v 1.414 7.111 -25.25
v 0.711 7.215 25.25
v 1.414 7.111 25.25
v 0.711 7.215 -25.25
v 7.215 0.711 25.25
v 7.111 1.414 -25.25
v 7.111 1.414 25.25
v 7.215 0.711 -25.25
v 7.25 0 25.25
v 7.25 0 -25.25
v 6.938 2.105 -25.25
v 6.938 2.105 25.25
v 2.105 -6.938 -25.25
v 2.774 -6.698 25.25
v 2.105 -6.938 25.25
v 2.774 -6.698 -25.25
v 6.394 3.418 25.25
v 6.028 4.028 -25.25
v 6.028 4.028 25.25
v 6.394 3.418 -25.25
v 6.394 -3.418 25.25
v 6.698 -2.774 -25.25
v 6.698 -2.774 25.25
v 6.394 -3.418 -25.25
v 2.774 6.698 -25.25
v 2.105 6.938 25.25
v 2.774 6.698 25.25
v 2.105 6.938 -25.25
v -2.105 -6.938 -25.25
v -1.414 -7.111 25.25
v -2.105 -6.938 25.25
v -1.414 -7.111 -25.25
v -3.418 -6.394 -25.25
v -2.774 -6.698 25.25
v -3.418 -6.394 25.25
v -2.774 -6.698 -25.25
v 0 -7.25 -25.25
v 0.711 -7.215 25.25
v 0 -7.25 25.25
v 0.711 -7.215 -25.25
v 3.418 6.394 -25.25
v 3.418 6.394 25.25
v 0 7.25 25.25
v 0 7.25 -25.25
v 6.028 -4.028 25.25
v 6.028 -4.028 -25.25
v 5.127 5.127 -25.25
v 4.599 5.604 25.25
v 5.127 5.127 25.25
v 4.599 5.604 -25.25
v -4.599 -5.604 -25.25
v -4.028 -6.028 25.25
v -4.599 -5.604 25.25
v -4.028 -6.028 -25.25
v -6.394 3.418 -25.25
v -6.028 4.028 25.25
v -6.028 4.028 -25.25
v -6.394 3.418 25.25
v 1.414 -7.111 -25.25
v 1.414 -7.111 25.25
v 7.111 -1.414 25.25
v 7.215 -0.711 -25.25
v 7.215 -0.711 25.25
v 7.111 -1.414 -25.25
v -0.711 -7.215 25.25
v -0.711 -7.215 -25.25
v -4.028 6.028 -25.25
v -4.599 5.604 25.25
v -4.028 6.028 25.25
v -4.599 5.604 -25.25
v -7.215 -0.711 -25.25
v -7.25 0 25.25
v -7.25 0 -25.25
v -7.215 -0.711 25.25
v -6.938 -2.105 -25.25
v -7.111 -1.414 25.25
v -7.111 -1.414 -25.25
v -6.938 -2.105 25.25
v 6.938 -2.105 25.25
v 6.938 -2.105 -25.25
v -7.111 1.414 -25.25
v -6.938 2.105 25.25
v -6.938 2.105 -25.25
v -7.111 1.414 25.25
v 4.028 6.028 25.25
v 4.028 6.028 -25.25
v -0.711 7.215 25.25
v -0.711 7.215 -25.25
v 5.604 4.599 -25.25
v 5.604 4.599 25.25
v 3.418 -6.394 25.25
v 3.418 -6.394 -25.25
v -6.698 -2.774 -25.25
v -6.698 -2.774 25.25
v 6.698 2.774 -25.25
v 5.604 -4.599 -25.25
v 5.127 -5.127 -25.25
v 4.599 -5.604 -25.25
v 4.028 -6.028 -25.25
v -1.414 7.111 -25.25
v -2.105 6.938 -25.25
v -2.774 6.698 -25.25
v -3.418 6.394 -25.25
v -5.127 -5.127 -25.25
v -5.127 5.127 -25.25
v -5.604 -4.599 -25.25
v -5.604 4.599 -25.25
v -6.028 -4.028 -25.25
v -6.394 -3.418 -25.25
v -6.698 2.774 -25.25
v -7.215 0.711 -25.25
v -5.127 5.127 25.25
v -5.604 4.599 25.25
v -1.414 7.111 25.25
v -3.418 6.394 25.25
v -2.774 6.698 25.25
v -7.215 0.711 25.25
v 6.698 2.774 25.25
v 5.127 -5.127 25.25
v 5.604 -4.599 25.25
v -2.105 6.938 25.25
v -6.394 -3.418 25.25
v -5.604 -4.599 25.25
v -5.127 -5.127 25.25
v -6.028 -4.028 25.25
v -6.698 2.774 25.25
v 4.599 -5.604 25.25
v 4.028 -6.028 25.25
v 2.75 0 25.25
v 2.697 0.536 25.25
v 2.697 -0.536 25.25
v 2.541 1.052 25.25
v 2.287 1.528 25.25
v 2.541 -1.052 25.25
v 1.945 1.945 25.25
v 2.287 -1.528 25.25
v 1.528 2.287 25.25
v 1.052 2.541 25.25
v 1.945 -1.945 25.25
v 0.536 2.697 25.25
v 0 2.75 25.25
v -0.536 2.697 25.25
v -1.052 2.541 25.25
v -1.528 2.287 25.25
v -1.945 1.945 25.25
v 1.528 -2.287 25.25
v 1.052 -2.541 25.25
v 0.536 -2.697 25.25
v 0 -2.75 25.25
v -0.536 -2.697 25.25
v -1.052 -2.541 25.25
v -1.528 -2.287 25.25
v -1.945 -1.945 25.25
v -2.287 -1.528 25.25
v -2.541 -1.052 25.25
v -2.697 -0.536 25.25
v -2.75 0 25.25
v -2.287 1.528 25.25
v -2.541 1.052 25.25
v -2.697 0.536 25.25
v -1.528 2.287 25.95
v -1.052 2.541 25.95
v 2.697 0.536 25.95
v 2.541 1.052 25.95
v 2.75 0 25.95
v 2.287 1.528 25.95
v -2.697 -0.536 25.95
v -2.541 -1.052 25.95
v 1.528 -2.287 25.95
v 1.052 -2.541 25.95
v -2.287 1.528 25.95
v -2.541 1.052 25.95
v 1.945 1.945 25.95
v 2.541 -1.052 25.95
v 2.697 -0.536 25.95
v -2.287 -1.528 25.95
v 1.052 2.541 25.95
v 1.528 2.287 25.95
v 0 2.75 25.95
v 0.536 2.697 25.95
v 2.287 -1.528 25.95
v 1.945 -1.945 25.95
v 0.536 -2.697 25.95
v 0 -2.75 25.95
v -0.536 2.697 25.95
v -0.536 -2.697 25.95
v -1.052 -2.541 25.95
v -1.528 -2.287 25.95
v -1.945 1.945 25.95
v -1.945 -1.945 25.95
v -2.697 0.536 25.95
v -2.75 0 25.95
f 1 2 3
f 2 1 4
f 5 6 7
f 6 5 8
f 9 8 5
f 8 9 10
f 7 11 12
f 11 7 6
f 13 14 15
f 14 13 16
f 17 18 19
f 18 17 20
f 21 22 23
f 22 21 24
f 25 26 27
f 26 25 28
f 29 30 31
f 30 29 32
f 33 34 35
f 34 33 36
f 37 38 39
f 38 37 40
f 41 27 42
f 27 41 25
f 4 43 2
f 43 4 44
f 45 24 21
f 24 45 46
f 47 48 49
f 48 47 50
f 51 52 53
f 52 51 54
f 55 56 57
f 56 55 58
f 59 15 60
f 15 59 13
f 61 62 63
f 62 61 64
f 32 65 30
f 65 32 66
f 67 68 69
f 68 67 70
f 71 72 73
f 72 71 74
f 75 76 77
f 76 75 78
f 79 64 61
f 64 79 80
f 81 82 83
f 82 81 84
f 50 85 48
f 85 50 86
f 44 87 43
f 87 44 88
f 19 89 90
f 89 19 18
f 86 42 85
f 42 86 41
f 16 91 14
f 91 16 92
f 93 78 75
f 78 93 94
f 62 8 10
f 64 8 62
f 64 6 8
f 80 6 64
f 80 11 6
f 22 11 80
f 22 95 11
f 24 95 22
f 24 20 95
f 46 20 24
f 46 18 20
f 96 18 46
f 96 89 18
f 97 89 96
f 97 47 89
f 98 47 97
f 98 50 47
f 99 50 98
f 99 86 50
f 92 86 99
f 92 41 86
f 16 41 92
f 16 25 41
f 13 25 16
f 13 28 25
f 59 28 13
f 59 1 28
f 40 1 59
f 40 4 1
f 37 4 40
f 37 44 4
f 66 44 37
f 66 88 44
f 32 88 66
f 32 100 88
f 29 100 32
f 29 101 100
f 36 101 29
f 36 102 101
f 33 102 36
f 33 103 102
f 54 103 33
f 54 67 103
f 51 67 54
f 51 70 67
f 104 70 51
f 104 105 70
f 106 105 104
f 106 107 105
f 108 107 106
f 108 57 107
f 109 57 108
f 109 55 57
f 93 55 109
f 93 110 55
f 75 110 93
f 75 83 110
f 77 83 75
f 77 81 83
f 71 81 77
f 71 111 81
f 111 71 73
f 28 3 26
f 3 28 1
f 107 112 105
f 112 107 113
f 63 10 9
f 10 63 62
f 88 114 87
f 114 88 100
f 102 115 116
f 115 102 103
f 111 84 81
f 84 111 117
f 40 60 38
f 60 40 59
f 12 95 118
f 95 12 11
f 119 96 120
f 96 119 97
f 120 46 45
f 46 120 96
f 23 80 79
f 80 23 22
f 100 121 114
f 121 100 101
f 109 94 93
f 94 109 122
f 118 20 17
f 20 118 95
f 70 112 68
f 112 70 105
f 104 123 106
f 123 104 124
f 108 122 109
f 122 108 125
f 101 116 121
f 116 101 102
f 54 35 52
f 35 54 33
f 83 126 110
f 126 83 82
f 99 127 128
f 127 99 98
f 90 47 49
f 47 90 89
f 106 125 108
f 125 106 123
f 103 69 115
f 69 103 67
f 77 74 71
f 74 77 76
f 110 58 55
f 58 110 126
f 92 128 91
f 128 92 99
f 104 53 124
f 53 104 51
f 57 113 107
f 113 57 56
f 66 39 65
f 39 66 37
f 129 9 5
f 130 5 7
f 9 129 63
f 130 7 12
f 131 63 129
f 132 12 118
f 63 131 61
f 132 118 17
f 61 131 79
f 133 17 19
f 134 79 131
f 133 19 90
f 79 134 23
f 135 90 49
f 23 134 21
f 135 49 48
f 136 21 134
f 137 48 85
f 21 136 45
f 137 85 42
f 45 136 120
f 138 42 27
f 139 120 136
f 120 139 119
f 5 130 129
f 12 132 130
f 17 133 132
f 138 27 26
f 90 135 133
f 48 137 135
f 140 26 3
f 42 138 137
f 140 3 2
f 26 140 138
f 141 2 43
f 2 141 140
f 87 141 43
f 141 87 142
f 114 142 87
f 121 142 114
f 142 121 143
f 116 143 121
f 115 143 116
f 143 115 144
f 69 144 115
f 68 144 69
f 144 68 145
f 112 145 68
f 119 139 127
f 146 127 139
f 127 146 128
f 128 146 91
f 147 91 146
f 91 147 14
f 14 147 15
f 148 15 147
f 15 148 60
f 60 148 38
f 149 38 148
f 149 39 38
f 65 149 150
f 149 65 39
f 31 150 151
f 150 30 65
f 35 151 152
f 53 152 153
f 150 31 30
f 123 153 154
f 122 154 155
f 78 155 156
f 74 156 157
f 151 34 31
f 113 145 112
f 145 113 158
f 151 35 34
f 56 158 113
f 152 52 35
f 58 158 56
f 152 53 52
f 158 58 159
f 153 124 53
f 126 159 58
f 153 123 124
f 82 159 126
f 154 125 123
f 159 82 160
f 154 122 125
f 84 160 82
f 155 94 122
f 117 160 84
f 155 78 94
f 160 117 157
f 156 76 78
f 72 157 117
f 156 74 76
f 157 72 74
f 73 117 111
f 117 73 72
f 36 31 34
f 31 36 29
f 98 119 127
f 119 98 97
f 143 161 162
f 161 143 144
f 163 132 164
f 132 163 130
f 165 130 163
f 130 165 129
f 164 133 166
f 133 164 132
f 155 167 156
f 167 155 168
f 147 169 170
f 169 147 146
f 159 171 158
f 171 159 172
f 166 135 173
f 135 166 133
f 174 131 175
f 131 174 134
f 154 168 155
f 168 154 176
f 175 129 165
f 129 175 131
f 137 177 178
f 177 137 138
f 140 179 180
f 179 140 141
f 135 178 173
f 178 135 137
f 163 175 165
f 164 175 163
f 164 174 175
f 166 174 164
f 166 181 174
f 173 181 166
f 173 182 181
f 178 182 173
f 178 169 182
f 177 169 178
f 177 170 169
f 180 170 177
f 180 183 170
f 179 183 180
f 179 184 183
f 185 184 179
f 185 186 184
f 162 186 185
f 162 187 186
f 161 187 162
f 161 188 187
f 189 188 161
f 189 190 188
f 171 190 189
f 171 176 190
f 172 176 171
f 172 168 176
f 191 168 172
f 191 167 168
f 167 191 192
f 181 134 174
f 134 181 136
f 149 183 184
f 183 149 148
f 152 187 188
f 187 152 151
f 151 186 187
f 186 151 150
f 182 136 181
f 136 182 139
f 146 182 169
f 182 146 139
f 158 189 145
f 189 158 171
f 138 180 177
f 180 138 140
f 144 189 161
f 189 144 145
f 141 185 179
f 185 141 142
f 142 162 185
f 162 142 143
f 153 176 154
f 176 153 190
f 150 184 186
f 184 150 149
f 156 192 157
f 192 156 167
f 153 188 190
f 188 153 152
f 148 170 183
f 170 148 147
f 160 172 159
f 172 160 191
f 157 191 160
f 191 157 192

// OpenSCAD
// Parameters
height_mm = 50.5; //[25.25:101:0.1]
diameter_mm = 14.5; //[7.25:29:0.1]
positive_terminal_diameter_mm = 5.5; //[2.75:11:0.1]
positive_terminal_height_mm = 1.5; //[0.75:3:0.1]
negative_terminal_diameter_mm = 6; //[3:12:0.1]
negative_terminal_height_mm = 0.2; //[0.1:0.6:0.05]
terminal_overlap_mm = 0.8; //[0.5:2:0.1]

// Battery - complete geometry
module battery() {
  union() {
    // Cylindrical cell body
    color([0.85, 0.85, 0.8]) // Off-white for battery body
    translate([0, 0, 0])
      cylinder(h=height_mm, r=diameter_mm/2, center=true, $fn=64);

    // Positive terminal button
    color("Silver") // Silver for positive terminal
    translate([0, 0, height_mm/2 + positive_terminal_height_mm/2 - terminal_overlap_mm])
      cylinder(h=positive_terminal_height_mm, r=positive_terminal_diameter_mm/2, center=true, $fn=32);

    // Negative terminal flat end
    color("Silver") // Silver for negative terminal
    translate([0, 0, -height_mm/2 - negative_terminal_height_mm/2 + terminal_overlap_mm])
      cylinder(h=negative_terminal_height_mm, r=negative_terminal_diameter_mm/2, center=true, $fn=32);
  }
}

// Assembly
module assembly() {
  battery();
}

assembly();
